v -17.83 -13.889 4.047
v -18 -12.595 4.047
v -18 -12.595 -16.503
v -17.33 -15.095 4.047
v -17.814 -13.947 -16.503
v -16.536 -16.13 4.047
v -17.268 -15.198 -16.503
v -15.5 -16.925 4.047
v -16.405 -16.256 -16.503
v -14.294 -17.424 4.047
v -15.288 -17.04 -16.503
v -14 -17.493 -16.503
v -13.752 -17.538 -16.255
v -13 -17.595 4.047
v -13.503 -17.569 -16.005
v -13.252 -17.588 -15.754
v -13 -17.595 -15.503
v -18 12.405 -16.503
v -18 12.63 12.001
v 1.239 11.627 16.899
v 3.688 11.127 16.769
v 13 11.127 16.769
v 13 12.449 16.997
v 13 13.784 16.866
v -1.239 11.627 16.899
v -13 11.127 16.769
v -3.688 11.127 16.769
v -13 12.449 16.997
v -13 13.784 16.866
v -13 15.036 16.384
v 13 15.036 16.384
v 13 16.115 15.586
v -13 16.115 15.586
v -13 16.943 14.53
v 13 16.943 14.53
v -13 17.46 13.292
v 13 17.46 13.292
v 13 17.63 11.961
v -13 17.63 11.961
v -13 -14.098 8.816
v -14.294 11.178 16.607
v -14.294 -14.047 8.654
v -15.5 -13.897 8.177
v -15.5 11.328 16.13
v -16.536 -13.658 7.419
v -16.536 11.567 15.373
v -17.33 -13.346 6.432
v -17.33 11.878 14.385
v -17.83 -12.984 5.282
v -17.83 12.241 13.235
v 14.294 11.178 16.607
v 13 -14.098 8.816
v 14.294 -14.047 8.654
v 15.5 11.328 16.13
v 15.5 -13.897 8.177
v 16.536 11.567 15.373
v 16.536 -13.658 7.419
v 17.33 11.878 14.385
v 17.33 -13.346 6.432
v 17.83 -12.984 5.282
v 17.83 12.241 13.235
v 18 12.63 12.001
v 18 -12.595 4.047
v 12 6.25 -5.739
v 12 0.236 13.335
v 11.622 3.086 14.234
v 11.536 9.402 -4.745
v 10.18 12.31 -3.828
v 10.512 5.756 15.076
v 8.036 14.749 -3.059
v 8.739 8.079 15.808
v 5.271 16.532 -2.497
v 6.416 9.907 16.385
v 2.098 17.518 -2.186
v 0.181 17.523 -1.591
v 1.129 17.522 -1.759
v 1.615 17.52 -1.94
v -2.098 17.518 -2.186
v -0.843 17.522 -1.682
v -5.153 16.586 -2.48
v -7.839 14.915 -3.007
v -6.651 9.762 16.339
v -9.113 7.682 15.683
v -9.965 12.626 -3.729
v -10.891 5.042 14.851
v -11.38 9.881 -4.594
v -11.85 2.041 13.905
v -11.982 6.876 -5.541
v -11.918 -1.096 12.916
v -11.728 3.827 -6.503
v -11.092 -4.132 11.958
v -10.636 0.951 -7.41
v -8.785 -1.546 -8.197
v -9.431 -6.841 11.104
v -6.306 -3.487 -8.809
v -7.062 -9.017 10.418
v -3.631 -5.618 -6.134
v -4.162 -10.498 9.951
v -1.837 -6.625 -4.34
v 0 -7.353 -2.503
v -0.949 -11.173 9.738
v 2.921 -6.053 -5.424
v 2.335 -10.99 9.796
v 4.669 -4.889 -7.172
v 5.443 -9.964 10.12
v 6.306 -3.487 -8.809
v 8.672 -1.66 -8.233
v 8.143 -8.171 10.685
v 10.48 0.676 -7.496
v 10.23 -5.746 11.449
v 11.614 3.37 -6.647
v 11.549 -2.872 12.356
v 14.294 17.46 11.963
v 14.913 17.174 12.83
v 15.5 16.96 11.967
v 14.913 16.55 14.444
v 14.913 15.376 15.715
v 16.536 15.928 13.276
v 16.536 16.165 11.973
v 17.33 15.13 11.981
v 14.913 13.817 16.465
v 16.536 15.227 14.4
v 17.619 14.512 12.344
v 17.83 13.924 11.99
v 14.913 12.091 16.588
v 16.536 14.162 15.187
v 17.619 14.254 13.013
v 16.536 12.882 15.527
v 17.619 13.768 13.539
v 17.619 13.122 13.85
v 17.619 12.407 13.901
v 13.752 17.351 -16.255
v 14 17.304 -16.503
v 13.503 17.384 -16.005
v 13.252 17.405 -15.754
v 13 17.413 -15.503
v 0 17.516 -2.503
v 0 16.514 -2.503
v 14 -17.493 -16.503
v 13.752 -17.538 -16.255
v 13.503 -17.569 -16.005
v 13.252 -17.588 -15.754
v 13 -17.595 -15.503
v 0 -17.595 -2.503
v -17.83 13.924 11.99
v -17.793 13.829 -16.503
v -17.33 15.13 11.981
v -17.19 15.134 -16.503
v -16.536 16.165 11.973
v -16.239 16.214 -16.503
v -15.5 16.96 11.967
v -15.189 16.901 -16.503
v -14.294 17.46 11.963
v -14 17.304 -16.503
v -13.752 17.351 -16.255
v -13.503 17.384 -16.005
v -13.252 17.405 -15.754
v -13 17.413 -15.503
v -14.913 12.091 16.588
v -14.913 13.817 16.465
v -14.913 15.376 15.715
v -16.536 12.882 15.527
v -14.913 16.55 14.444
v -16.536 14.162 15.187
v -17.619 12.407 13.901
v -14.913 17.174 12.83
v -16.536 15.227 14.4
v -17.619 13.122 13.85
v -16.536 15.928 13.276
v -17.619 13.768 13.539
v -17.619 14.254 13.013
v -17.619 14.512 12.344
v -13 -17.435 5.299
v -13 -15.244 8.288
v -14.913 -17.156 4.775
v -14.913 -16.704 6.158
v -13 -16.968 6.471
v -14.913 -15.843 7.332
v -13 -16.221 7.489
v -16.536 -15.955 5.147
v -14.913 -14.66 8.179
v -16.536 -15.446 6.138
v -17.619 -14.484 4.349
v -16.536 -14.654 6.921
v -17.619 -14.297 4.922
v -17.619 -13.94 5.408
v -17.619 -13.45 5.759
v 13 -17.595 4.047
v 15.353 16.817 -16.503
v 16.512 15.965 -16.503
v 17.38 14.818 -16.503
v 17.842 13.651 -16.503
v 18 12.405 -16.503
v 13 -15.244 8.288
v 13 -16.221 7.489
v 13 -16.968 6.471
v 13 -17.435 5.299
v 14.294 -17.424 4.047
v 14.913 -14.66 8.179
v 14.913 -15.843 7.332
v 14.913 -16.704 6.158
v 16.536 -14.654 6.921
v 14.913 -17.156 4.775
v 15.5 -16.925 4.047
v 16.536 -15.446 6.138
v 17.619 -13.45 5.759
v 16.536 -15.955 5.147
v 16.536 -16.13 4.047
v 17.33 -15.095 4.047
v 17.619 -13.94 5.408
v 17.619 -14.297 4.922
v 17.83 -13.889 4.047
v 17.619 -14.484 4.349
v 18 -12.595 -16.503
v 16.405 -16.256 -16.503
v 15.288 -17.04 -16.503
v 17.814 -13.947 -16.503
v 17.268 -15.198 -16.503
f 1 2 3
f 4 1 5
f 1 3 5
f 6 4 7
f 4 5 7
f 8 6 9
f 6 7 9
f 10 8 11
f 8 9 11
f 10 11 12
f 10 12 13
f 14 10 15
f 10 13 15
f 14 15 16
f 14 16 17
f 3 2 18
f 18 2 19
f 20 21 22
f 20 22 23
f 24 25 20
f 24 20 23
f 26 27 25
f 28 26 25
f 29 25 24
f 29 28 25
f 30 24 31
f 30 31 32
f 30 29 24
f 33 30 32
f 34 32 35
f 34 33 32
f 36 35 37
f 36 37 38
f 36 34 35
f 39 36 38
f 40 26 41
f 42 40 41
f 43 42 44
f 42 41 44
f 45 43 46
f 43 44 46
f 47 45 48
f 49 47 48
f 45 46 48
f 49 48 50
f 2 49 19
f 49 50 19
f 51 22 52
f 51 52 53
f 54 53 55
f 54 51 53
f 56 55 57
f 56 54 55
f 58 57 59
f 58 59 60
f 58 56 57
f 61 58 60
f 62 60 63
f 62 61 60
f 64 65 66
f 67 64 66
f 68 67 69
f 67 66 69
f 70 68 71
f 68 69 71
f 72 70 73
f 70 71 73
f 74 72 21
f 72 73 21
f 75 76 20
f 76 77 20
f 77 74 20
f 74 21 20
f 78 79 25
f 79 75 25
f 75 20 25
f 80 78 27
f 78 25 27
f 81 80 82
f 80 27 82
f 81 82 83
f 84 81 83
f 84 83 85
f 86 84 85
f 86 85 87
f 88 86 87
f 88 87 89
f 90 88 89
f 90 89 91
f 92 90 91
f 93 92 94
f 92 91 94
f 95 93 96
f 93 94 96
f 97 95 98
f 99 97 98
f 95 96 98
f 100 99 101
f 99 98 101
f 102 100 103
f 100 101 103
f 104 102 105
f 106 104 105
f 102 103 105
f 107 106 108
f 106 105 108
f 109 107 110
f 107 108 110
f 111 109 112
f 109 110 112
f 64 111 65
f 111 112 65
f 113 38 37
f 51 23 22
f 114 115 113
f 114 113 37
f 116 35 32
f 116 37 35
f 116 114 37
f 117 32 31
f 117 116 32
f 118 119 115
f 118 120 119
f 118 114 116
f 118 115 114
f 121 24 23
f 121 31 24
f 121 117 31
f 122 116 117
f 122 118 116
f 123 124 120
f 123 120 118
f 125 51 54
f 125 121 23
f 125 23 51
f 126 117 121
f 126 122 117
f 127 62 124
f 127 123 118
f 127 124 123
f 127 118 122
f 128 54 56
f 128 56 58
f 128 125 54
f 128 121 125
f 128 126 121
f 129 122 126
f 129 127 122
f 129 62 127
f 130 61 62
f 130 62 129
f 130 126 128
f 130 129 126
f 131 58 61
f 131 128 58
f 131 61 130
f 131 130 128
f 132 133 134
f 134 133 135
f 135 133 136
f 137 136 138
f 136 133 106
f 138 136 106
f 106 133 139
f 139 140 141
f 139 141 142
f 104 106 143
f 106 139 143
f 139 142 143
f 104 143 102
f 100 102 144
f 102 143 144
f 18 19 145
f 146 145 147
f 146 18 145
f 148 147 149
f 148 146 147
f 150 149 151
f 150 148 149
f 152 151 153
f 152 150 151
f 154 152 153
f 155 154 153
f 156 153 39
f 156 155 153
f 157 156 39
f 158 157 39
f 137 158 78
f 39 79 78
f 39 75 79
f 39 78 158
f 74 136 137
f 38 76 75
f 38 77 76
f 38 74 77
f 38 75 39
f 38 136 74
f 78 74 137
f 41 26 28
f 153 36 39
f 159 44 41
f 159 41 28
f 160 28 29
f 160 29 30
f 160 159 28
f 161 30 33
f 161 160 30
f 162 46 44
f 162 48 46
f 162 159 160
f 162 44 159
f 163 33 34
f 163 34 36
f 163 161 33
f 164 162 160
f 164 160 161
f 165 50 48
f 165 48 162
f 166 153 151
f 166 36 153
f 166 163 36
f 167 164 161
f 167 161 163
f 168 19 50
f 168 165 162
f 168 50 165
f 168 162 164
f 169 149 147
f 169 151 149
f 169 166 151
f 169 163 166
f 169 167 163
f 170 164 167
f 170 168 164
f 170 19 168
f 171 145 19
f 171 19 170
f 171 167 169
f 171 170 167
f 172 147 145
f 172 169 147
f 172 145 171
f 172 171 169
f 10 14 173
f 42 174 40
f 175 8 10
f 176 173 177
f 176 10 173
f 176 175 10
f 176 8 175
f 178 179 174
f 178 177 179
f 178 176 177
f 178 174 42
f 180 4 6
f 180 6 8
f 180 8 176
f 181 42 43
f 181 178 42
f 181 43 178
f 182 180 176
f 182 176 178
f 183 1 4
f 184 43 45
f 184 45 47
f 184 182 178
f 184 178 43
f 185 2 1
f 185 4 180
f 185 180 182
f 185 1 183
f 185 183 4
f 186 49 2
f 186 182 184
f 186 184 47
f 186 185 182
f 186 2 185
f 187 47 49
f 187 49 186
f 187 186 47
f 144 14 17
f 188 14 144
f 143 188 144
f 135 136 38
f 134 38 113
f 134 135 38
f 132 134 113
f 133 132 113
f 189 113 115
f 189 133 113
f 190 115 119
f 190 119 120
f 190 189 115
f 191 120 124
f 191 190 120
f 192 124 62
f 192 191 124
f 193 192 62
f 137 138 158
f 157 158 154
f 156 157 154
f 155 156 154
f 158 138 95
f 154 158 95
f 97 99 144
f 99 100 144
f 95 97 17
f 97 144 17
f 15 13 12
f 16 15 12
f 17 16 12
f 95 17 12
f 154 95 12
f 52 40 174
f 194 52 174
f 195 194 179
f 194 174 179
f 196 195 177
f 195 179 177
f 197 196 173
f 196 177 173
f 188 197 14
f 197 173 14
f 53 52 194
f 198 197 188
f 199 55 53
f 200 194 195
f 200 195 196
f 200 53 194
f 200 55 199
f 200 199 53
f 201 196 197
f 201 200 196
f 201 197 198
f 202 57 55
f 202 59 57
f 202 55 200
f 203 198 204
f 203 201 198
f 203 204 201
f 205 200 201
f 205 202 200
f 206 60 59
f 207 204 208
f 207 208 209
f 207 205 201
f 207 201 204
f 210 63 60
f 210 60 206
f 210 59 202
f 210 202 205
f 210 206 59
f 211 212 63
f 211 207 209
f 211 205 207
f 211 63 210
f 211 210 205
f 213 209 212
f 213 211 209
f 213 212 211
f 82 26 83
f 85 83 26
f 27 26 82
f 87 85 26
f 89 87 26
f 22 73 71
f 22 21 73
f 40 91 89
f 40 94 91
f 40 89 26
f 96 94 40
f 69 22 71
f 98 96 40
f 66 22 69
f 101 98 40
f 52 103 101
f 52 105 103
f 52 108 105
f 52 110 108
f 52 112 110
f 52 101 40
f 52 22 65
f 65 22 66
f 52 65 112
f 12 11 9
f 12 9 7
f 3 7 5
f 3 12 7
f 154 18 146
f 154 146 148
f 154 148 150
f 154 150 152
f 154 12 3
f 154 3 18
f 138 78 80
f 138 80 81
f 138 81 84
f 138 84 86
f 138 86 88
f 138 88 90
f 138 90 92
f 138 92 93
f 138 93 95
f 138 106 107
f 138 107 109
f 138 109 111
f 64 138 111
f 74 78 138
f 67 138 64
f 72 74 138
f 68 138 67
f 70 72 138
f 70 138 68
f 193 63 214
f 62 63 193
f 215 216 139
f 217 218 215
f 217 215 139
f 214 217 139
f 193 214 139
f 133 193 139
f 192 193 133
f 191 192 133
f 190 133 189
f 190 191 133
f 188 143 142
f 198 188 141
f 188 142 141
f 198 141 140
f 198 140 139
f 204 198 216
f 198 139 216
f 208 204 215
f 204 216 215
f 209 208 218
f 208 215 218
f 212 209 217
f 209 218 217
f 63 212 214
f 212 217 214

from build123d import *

# Parameters (mm, degrees)
F1_DEPTH     = 18
F2_R         = 12
F3_DEPTH     = 20
F5_DEPTH     = 19
F6_T1_DEPTH  = 33.0501766006
F6_T3_DEPTH  = 26
F6_T5_DEPTH  = 26.4486901769
F6_T7_DEPTH  = 40.9649172436
F6_T12_DEPTH = 5
F6_T18_DEPTH = 5
F6_T24_DEPTH = 5
F6_T30_DEPTH = 5


# Not quite as in the source:
# - a fillet or chamfer that OpenCascade refuses, or shapes differently, is made with other operations: its cross-section is extruded or revolved along the edge and cut away or added


with BuildPart() as f1:
    # F0 (on Right) → F1 (new body, symmetric)
    with BuildSketch(Plane.YZ):
        Polygon((-17.5945106894, -16.5027584881), (17.4054893106, -16.5027584881), (17.6841049034, 18.8368745636), (-17.5945106894, 7.7135697939), align=None)
    extrude(amount=F1_DEPTH, both=True)

    # F2 (on face) → F3 (cut)
    with BuildSketch(Plane(origin=(0, -3.8031265819, 12.0619764999), x_dir=(1, 0, 0), z_dir=(0, -0.3007057995, 0.9537169507))):
        with Locations((0, 4.2350762524)):
            Circle(F2_R)
    extrude(amount=-F3_DEPTH, mode=Mode.SUBTRACT)

    # F4 (on Front) → F5 (cut, symmetric)
    with BuildSketch(Plane.XZ):
        Polygon((18.3847763109, -20.8875347989), (0, -2.5027584881), (-18.3847763109, -20.8875347989), (0, -39.2723111098), align=None)
    extrude(amount=F5_DEPTH, both=True, mode=Mode.SUBTRACT)

    # F6: fillet of radius 5 on 8 edges, made by hand

    # F6_s2 → F6_t1 (cut)
    with BuildSketch(Plane.XY.offset(-29.0027584881)):
        with BuildLine():
            ThreePointArc((-18, -12.5945106894), (-16.5355339059, -16.1300445953), (-13, -17.5945106894))
            Line((-13, -17.5945106894), (-18, -17.5945106894))
            Line((-18, -17.5945106894), (-18, -12.5945106894))
        make_face()
        with BuildLine():
            ThreePointArc((13, -17.5945106894), (16.5355339059, -16.1300445953), (18, -12.5945106894))
            Line((18, -12.5945106894), (18, -17.5945106894))
            Line((18, -17.5945106894), (13, -17.5945106894))
        make_face()
    extrude(amount=F6_T1_DEPTH, mode=Mode.SUBTRACT)

    # F6_s4 → F6_t3 (cut)
    with BuildSketch(Plane.YZ.offset(-13)):
        with BuildLine():
            ThreePointArc((-14.0980396869, 8.8160028663), (-16.6267337107, 7.0039663544), (-17.5945106894, 4.0474181125))
            Line((-17.5945106894, 4.0474181125), (-17.5945106894, 7.7135697939))
            Line((-17.5945106894, 7.7135697939), (-14.0980396869, 8.8160028663))
        make_face()
        with BuildLine():
            ThreePointArc((11.1265244599, 16.7692773918), (15.6024732635, 16.0212299773), (17.6298980733, 11.9612741565))
            Line((17.6298980733, 11.9612741565), (17.6841049034, 18.8368745636))
            Line((17.6841049034, 18.8368745636), (11.1265244599, 16.7692773918))
        make_face()
    extrude(amount=F6_T3_DEPTH, mode=Mode.SUBTRACT)

    # F6_s6 → F6_t5 (cut)
    with BuildSketch(Plane(origin=(0, 14.9296510418, 4.7073008919), x_dir=(1, 0, 0), z_dir=(0, -0.9537169507, -0.3007057995))):
        with BuildLine():
            ThreePointArc((-13, 12.6473336669), (-16.5355339059, 11.1828675728), (-18, 7.6473336669))
            Line((-18, 7.6473336669), (-18, 12.6473336669))
            Line((-18, 12.6473336669), (-13, 12.6473336669))
        make_face()
        with BuildLine():
            ThreePointArc((13, 12.6473336669), (16.5355339059, 11.1828675728), (18, 7.6473336669))
            Line((18, 7.6473336669), (18, 12.6473336669))
            Line((18, 12.6473336669), (13, 12.6473336669))
        make_face()
    extrude(amount=F6_T5_DEPTH, mode=Mode.SUBTRACT)

    # F6_s8 → F6_t7 (cut)
    with BuildSketch(Plane(origin=(0, -0.227563099, -28.8641290101), x_dir=(1, 0, 0), z_dir=(0, 0.0078836963, 0.9999689232))):
        with BuildLine():
            ThreePointArc((13, 17.5350511394), (16.5355339059, 16.0705850454), (18, 12.5350511394))
            Line((18, 12.5350511394), (18, 17.5350511394))
            Line((18, 17.5350511394), (13, 17.5350511394))
        make_face()
        with BuildLine():
            ThreePointArc((-18, 12.5350511394), (-16.5355339059, 16.0705850454), (-13, 17.5350511394))
            Line((-13, 17.5350511394), (-18, 17.5350511394))
            Line((-18, 17.5350511394), (-18, 12.5350511394))
        make_face()
    extrude(amount=F6_T7_DEPTH, mode=Mode.SUBTRACT)


with BuildPart() as f6_tool10:
    # F6_s11 → F6_t12 (new body)
    with BuildSketch(Plane.YZ.offset(-13)):
        Polygon((-12.5945106894, 4.0474181125), (-17.5945106894, 4.0474181125), (-17.5945106894, 7.7135697939), (-14.0980396869, 8.8160028663), align=None)
    extrude(amount=-F6_T12_DEPTH)

    # F6_s13 → F6_t14 (revolve, cut)
    with BuildSketch(Plane(origin=(-13, -12.5945106894, 4.0474181125), x_dir=(0, 0.8064446043, -0.5913096484), z_dir=(0, 0.5913096484, 0.8064446043))):
        with BuildLine():
            ThreePointArc((0, -5), (5, 0), (0, 5))
            Line((0, 5), (0, -5))
        make_face()
    revolve(axis=Axis((-13, -12.5945106894, 4.0474181125), (-1, 0, 0)), mode=Mode.SUBTRACT)


with BuildPart() as f1_1:
    add(f1.part)

    # F6_t9: cut F6_tool10
    add(f6_tool10.part, mode=Mode.SUBTRACT)


with BuildPart() as f6_tool16:
    # F6_s17 → F6_t18 (new body)
    with BuildSketch(Plane.YZ.offset(13)):
        Polygon((-12.5945106894, 4.0474181125), (-14.0980396869, 8.8160028663), (-17.5945106894, 7.7135697939), (-17.5945106894, 4.0474181125), align=None)
    extrude(amount=F6_T18_DEPTH)

    # F6_s19 → F6_t20 (revolve, cut)
    with BuildSketch(Plane(origin=(13, -12.5945106894, 4.0474181125), x_dir=(0, 0.8064446043, -0.5913096484), z_dir=(0, -0.5913096484, -0.8064446043))):
        with BuildLine():
            ThreePointArc((0, -5), (5, 0), (0, 5))
            Line((0, 5), (0, -5))
        make_face()
    revolve(axis=Axis((13, -12.5945106894, 4.0474181125), (1, 0, 0)), mode=Mode.SUBTRACT)


with BuildPart() as f1_2:
    add(f1_1.part)

    # F6_t15: cut F6_tool16
    add(f6_tool16.part, mode=Mode.SUBTRACT)


with BuildPart() as f6_tool22:
    # F6_s23 → F6_t24 (new body)
    with BuildSketch(Plane.YZ.offset(-13)):
        Polygon((12.6300534574, 12.000692638), (17.6298980733, 11.9612741565), (17.6841049034, 18.8368745636), (11.1265244599, 16.7692773918), align=None)
    extrude(amount=-F6_T24_DEPTH)

    # F6_s25 → F6_t26 (revolve, cut)
    with BuildSketch(Plane(origin=(-13, 12.6300534574, 12.000692638), x_dir=(0, -0.5944839612, -0.8041074679), z_dir=(0, 0.8041074679, -0.5944839612))):
        with BuildLine():
            ThreePointArc((0, -5), (5, 0), (0, 5))
            Line((0, 5), (0, -5))
        make_face()
    revolve(axis=Axis((-13, 12.6300534574, 12.000692638), (-1, 0, 0)), mode=Mode.SUBTRACT)


with BuildPart() as f1_3:
    add(f1_2.part)

    # F6_t21: cut F6_tool22
    add(f6_tool22.part, mode=Mode.SUBTRACT)


with BuildPart() as f6_tool28:
    # F6_s29 → F6_t30 (new body)
    with BuildSketch(Plane.YZ.offset(13)):
        Polygon((12.6300534574, 12.000692638), (11.1265244599, 16.7692773918), (17.6841049034, 18.8368745636), (17.6298980733, 11.9612741565), align=None)
    extrude(amount=F6_T30_DEPTH)

    # F6_s31 → F6_t32 (revolve, cut)
    with BuildSketch(Plane(origin=(13, 12.6300534574, 12.000692638), x_dir=(0, -0.5944839612, -0.8041074679), z_dir=(0, -0.8041074679, 0.5944839612))):
        with BuildLine():
            ThreePointArc((0, -5), (5, 0), (0, 5))
            Line((0, 5), (0, -5))
        make_face()
    revolve(axis=Axis((13, 12.6300534574, 12.000692638), (1, 0, 0)), mode=Mode.SUBTRACT)


with BuildPart() as f1_4:
    add(f1_3.part)

    # F6_t27: cut F6_tool28
    add(f6_tool28.part, mode=Mode.SUBTRACT)


solid = f1_4.part
